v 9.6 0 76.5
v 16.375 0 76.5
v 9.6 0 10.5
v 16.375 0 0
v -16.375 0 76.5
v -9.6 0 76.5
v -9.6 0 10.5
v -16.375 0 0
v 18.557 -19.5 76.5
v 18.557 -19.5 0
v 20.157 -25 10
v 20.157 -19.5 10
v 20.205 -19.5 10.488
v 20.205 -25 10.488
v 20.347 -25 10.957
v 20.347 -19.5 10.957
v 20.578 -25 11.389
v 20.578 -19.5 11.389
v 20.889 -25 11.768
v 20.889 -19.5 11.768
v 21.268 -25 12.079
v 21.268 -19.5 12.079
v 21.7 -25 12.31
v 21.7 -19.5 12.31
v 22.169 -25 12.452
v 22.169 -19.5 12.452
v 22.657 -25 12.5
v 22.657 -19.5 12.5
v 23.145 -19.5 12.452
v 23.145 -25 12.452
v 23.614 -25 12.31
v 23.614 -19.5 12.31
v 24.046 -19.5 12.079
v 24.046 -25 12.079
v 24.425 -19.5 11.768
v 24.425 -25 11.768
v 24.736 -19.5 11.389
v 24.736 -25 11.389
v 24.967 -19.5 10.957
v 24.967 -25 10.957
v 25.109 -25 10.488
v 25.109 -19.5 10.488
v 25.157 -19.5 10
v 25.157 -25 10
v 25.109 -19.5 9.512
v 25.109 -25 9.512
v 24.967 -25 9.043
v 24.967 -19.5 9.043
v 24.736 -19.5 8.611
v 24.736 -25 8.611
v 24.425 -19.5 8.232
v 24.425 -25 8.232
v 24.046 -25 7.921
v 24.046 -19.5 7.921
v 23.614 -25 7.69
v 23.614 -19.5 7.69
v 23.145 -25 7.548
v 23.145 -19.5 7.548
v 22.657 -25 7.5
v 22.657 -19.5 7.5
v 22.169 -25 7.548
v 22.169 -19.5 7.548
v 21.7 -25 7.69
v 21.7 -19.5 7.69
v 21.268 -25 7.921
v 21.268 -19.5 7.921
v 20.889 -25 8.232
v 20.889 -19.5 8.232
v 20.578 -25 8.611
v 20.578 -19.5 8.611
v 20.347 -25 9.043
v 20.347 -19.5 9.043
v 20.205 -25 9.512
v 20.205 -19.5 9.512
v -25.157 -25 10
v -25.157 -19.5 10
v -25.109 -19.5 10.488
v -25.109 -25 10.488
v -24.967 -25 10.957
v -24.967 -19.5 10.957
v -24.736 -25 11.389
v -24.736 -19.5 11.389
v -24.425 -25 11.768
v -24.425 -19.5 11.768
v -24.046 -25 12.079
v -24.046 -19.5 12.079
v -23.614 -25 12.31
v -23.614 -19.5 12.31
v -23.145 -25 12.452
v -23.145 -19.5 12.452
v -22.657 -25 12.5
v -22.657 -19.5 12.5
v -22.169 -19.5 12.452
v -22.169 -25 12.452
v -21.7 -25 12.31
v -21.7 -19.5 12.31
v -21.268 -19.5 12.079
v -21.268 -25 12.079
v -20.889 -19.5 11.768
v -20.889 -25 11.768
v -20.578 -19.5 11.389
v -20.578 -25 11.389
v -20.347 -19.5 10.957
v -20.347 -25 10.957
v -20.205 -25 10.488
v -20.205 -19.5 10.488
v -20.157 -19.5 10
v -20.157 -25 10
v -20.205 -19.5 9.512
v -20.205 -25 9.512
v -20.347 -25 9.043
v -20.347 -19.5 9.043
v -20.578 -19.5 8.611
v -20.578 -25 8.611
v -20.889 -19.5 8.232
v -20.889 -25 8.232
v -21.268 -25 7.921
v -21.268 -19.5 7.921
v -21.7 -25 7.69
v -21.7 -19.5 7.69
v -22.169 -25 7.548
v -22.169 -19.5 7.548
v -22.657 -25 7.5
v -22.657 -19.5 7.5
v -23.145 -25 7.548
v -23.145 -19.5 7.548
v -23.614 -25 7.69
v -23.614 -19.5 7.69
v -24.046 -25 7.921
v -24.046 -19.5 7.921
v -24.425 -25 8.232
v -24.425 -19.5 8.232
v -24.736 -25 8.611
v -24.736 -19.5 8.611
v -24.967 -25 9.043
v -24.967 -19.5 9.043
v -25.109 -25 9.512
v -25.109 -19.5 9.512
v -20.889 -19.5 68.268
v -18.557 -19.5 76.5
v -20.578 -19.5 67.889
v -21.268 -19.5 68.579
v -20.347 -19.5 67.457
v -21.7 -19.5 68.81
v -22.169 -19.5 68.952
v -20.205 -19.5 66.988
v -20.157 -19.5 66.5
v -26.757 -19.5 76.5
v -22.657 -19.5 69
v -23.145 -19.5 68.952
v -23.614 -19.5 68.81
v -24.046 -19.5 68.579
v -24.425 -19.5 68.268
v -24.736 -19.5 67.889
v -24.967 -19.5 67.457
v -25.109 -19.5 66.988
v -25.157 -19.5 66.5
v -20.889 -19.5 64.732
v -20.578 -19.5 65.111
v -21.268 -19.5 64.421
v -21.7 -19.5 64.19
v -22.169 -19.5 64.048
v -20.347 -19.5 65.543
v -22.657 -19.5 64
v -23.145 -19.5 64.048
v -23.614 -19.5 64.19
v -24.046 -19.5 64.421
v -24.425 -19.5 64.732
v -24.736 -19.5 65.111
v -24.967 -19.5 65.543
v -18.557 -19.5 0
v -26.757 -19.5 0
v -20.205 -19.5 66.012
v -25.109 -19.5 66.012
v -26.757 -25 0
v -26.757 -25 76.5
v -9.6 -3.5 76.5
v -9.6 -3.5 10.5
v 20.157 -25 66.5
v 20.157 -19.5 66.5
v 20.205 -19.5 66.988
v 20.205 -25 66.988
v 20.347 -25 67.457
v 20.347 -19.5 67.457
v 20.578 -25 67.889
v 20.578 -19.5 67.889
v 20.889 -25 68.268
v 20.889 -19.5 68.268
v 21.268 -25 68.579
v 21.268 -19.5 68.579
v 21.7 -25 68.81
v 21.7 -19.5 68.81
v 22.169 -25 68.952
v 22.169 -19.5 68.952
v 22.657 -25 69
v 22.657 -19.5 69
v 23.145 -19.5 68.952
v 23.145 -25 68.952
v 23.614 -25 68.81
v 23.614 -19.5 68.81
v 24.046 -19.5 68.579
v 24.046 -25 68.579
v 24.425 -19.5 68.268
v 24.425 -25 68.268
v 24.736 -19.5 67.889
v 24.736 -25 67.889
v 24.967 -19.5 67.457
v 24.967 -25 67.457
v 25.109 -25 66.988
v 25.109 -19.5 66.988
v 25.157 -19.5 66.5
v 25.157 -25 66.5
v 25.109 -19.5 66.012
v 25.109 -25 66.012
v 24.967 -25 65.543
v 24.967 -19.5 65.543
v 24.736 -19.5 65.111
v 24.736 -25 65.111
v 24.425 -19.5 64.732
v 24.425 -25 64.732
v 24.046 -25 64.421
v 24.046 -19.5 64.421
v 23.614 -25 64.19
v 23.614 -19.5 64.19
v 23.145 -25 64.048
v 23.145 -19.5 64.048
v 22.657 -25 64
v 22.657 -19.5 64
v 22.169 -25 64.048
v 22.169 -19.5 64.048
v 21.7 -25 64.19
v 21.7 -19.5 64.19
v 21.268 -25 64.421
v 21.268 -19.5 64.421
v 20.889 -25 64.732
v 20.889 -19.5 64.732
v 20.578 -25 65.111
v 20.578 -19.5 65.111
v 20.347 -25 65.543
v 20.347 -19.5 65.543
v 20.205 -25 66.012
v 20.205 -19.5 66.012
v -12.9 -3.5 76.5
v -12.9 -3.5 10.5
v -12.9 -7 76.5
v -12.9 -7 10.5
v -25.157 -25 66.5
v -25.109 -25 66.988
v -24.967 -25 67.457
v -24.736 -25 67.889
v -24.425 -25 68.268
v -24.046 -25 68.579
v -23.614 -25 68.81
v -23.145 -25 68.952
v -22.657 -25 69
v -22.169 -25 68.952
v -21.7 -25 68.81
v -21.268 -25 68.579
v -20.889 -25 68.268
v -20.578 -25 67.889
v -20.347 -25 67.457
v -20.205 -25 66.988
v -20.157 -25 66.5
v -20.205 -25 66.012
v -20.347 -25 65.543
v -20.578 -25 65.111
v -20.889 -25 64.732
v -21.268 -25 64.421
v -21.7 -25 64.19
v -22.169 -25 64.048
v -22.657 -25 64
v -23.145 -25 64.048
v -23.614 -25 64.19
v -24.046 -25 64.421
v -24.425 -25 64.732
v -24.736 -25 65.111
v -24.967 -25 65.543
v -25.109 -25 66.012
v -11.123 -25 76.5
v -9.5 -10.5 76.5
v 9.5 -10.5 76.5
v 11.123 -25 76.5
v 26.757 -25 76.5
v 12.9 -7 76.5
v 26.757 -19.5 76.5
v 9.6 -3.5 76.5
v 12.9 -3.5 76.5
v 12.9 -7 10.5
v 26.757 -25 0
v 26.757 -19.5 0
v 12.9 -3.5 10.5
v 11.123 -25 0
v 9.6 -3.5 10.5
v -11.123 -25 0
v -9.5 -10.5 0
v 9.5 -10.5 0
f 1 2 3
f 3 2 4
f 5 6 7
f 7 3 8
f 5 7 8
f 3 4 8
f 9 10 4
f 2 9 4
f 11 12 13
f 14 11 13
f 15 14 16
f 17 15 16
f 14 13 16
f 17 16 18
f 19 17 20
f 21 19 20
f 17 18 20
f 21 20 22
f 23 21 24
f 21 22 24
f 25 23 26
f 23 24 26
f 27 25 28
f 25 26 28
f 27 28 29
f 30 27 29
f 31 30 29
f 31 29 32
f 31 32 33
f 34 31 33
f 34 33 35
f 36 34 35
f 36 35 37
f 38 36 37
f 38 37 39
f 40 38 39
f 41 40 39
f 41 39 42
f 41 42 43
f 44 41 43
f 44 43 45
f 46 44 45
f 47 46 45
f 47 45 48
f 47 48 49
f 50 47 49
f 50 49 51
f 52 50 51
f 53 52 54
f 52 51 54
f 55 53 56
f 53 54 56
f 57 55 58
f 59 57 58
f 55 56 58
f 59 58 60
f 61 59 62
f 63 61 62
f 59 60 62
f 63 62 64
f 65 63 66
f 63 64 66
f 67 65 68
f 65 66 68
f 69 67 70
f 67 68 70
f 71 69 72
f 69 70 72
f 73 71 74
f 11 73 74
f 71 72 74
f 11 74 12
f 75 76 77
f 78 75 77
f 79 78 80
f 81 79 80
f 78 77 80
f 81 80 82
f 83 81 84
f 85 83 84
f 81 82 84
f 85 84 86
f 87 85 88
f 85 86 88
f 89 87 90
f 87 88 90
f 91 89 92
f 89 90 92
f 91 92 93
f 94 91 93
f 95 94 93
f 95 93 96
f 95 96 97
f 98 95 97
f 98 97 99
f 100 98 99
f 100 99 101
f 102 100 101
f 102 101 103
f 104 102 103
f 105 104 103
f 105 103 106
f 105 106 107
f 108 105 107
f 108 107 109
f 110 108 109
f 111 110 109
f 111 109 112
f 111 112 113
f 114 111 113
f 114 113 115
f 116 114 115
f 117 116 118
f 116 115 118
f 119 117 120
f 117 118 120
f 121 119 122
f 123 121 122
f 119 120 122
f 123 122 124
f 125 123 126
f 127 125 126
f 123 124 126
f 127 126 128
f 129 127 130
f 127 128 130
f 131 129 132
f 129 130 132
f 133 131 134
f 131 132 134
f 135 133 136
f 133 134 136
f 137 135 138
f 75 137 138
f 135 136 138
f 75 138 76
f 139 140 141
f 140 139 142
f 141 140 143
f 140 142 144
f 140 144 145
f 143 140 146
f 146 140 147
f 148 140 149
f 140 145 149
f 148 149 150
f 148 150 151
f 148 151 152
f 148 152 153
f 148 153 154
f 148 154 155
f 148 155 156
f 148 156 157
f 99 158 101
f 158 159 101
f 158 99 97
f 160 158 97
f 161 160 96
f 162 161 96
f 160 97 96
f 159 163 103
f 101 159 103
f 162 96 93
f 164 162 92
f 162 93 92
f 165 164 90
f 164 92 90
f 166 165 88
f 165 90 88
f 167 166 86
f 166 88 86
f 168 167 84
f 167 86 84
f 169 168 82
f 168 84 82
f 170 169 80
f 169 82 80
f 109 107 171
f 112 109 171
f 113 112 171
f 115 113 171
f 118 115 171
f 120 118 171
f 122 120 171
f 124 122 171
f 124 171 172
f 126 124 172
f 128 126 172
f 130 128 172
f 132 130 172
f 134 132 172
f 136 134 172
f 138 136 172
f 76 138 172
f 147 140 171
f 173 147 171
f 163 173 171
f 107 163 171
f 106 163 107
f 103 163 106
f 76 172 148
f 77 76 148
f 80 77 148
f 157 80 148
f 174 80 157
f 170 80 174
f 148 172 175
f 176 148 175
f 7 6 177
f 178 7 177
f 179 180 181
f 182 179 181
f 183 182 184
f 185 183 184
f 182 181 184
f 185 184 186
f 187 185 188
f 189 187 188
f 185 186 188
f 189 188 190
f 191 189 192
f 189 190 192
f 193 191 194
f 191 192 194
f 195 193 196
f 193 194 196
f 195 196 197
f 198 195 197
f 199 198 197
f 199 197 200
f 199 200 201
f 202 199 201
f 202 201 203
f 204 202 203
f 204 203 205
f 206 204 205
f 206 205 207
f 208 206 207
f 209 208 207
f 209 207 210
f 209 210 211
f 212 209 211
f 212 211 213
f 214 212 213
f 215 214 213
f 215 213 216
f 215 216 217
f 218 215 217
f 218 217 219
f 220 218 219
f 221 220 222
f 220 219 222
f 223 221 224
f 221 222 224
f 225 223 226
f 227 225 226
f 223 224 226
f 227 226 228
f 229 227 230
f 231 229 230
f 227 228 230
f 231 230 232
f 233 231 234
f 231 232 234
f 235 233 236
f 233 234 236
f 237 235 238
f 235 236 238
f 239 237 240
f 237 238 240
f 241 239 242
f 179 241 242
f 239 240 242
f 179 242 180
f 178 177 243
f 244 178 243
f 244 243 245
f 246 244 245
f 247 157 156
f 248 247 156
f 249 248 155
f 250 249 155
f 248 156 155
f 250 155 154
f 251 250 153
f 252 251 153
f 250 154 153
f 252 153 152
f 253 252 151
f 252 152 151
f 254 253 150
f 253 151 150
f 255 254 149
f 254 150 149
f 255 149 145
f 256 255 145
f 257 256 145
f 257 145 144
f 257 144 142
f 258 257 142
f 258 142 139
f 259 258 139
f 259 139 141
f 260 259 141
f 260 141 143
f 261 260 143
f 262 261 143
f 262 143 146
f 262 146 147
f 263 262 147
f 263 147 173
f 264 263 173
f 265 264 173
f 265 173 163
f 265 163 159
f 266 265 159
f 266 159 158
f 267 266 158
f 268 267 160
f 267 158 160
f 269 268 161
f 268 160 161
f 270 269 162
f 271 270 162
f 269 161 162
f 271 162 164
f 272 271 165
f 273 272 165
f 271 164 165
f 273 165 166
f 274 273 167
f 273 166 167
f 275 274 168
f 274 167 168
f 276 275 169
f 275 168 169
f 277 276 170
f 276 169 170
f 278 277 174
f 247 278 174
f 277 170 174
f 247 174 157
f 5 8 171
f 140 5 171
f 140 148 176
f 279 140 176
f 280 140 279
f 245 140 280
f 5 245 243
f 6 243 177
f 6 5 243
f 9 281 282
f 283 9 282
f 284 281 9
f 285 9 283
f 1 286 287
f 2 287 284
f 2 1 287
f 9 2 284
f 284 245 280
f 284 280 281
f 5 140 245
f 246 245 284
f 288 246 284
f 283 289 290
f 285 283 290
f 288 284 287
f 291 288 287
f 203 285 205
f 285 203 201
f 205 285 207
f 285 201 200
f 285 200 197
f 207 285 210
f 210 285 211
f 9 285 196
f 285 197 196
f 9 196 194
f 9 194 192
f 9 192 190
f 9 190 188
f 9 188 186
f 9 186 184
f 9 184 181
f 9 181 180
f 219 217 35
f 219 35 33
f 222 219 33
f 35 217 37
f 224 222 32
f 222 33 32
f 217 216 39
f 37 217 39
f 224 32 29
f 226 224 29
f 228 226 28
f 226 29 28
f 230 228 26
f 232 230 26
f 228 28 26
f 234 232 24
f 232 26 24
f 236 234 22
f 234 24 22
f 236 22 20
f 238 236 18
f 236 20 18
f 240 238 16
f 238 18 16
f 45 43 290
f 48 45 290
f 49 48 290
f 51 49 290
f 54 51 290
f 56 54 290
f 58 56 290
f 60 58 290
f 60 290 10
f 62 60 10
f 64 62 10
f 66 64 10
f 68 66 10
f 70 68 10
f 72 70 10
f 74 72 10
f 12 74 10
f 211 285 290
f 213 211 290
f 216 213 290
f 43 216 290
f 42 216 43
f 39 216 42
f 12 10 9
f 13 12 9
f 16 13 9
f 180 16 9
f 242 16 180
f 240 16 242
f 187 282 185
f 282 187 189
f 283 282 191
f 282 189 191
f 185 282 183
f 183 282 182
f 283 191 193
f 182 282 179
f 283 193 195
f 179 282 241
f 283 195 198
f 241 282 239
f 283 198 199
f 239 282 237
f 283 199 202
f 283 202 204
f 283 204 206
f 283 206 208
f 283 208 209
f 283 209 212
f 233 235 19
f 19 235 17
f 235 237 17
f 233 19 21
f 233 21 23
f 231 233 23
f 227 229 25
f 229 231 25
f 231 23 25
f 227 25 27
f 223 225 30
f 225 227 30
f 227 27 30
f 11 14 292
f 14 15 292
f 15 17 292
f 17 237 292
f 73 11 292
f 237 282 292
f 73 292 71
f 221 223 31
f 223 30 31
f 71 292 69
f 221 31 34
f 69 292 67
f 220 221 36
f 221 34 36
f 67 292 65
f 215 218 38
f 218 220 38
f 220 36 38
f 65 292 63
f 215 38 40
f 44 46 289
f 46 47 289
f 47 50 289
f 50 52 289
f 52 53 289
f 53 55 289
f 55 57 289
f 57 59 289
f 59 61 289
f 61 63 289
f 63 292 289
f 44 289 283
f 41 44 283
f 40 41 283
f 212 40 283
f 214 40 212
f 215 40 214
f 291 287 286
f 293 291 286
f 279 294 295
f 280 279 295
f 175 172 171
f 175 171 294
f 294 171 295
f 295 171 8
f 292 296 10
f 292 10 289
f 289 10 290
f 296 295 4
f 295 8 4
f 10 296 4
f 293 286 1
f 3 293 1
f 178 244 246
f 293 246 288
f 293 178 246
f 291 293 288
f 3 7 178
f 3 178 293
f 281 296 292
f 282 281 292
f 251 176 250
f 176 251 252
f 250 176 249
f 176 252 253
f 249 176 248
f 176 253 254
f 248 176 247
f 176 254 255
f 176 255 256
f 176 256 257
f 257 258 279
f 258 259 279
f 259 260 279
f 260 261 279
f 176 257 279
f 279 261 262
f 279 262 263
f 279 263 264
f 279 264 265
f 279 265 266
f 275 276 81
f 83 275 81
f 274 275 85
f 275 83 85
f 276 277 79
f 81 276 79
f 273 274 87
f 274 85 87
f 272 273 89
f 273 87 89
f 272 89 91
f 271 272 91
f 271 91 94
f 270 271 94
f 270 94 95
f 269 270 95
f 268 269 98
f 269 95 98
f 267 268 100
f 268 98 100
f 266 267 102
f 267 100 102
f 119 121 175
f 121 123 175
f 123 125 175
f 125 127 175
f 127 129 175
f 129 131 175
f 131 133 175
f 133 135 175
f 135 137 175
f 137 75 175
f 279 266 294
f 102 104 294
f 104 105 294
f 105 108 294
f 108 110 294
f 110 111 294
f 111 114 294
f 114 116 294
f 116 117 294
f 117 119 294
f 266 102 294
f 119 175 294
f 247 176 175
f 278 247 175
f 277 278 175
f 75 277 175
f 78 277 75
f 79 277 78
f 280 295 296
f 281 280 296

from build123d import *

# Parameters (mm, degrees)
F1_DEPTH = 76.5
F3_DEPTH = 66
F4_R     = 2.5
F5_DEPTH = 5.501


with BuildPart() as f1:
    # F0 (on Top) → F1 (new body)
    with BuildSketch(Plane.XY):
        Polygon((18.557011, -19.5), (16.375, 0), (0, 0), (-16.375, 0), (-18.557011, -19.5), (-26.757011, -19.5), (-26.757011, -25), (-11.122521, -25), (-9.5, -10.5), (0, -10.5), (9.5, -10.5), (11.122521, -25), (26.757011, -25), (26.757011, -19.5), align=None)
    extrude(amount=F1_DEPTH)

    # F2 (on face) → F3 (cut)
    with BuildSketch(Plane.XY.offset(76.5)):
        Polygon((9.6, 0), (-9.6, 0), (-9.6, -3.5), (-12.9, -3.5), (-12.9, -7), (12.9, -7), (12.9, -3.5), (9.6, -3.5), align=None)
    extrude(amount=-F3_DEPTH, mode=Mode.SUBTRACT)

    # F4 (on face) → F5 (cut, through all)
    with BuildSketch(Plane(origin=(0, -19.5, 0), x_dir=(-1, 0, 0), z_dir=(0, 1, 0))):
        with Locations((22.657011, 10)):
            Circle(F4_R)
        with Locations((22.657011, 66.5)):
            Circle(F4_R)
        with Locations((-22.657011, 10)):
            Circle(F4_R)
        with Locations((-22.657011, 66.5)):
            Circle(F4_R)
    extrude(amount=-F5_DEPTH, mode=Mode.SUBTRACT)


solid = f1.part
